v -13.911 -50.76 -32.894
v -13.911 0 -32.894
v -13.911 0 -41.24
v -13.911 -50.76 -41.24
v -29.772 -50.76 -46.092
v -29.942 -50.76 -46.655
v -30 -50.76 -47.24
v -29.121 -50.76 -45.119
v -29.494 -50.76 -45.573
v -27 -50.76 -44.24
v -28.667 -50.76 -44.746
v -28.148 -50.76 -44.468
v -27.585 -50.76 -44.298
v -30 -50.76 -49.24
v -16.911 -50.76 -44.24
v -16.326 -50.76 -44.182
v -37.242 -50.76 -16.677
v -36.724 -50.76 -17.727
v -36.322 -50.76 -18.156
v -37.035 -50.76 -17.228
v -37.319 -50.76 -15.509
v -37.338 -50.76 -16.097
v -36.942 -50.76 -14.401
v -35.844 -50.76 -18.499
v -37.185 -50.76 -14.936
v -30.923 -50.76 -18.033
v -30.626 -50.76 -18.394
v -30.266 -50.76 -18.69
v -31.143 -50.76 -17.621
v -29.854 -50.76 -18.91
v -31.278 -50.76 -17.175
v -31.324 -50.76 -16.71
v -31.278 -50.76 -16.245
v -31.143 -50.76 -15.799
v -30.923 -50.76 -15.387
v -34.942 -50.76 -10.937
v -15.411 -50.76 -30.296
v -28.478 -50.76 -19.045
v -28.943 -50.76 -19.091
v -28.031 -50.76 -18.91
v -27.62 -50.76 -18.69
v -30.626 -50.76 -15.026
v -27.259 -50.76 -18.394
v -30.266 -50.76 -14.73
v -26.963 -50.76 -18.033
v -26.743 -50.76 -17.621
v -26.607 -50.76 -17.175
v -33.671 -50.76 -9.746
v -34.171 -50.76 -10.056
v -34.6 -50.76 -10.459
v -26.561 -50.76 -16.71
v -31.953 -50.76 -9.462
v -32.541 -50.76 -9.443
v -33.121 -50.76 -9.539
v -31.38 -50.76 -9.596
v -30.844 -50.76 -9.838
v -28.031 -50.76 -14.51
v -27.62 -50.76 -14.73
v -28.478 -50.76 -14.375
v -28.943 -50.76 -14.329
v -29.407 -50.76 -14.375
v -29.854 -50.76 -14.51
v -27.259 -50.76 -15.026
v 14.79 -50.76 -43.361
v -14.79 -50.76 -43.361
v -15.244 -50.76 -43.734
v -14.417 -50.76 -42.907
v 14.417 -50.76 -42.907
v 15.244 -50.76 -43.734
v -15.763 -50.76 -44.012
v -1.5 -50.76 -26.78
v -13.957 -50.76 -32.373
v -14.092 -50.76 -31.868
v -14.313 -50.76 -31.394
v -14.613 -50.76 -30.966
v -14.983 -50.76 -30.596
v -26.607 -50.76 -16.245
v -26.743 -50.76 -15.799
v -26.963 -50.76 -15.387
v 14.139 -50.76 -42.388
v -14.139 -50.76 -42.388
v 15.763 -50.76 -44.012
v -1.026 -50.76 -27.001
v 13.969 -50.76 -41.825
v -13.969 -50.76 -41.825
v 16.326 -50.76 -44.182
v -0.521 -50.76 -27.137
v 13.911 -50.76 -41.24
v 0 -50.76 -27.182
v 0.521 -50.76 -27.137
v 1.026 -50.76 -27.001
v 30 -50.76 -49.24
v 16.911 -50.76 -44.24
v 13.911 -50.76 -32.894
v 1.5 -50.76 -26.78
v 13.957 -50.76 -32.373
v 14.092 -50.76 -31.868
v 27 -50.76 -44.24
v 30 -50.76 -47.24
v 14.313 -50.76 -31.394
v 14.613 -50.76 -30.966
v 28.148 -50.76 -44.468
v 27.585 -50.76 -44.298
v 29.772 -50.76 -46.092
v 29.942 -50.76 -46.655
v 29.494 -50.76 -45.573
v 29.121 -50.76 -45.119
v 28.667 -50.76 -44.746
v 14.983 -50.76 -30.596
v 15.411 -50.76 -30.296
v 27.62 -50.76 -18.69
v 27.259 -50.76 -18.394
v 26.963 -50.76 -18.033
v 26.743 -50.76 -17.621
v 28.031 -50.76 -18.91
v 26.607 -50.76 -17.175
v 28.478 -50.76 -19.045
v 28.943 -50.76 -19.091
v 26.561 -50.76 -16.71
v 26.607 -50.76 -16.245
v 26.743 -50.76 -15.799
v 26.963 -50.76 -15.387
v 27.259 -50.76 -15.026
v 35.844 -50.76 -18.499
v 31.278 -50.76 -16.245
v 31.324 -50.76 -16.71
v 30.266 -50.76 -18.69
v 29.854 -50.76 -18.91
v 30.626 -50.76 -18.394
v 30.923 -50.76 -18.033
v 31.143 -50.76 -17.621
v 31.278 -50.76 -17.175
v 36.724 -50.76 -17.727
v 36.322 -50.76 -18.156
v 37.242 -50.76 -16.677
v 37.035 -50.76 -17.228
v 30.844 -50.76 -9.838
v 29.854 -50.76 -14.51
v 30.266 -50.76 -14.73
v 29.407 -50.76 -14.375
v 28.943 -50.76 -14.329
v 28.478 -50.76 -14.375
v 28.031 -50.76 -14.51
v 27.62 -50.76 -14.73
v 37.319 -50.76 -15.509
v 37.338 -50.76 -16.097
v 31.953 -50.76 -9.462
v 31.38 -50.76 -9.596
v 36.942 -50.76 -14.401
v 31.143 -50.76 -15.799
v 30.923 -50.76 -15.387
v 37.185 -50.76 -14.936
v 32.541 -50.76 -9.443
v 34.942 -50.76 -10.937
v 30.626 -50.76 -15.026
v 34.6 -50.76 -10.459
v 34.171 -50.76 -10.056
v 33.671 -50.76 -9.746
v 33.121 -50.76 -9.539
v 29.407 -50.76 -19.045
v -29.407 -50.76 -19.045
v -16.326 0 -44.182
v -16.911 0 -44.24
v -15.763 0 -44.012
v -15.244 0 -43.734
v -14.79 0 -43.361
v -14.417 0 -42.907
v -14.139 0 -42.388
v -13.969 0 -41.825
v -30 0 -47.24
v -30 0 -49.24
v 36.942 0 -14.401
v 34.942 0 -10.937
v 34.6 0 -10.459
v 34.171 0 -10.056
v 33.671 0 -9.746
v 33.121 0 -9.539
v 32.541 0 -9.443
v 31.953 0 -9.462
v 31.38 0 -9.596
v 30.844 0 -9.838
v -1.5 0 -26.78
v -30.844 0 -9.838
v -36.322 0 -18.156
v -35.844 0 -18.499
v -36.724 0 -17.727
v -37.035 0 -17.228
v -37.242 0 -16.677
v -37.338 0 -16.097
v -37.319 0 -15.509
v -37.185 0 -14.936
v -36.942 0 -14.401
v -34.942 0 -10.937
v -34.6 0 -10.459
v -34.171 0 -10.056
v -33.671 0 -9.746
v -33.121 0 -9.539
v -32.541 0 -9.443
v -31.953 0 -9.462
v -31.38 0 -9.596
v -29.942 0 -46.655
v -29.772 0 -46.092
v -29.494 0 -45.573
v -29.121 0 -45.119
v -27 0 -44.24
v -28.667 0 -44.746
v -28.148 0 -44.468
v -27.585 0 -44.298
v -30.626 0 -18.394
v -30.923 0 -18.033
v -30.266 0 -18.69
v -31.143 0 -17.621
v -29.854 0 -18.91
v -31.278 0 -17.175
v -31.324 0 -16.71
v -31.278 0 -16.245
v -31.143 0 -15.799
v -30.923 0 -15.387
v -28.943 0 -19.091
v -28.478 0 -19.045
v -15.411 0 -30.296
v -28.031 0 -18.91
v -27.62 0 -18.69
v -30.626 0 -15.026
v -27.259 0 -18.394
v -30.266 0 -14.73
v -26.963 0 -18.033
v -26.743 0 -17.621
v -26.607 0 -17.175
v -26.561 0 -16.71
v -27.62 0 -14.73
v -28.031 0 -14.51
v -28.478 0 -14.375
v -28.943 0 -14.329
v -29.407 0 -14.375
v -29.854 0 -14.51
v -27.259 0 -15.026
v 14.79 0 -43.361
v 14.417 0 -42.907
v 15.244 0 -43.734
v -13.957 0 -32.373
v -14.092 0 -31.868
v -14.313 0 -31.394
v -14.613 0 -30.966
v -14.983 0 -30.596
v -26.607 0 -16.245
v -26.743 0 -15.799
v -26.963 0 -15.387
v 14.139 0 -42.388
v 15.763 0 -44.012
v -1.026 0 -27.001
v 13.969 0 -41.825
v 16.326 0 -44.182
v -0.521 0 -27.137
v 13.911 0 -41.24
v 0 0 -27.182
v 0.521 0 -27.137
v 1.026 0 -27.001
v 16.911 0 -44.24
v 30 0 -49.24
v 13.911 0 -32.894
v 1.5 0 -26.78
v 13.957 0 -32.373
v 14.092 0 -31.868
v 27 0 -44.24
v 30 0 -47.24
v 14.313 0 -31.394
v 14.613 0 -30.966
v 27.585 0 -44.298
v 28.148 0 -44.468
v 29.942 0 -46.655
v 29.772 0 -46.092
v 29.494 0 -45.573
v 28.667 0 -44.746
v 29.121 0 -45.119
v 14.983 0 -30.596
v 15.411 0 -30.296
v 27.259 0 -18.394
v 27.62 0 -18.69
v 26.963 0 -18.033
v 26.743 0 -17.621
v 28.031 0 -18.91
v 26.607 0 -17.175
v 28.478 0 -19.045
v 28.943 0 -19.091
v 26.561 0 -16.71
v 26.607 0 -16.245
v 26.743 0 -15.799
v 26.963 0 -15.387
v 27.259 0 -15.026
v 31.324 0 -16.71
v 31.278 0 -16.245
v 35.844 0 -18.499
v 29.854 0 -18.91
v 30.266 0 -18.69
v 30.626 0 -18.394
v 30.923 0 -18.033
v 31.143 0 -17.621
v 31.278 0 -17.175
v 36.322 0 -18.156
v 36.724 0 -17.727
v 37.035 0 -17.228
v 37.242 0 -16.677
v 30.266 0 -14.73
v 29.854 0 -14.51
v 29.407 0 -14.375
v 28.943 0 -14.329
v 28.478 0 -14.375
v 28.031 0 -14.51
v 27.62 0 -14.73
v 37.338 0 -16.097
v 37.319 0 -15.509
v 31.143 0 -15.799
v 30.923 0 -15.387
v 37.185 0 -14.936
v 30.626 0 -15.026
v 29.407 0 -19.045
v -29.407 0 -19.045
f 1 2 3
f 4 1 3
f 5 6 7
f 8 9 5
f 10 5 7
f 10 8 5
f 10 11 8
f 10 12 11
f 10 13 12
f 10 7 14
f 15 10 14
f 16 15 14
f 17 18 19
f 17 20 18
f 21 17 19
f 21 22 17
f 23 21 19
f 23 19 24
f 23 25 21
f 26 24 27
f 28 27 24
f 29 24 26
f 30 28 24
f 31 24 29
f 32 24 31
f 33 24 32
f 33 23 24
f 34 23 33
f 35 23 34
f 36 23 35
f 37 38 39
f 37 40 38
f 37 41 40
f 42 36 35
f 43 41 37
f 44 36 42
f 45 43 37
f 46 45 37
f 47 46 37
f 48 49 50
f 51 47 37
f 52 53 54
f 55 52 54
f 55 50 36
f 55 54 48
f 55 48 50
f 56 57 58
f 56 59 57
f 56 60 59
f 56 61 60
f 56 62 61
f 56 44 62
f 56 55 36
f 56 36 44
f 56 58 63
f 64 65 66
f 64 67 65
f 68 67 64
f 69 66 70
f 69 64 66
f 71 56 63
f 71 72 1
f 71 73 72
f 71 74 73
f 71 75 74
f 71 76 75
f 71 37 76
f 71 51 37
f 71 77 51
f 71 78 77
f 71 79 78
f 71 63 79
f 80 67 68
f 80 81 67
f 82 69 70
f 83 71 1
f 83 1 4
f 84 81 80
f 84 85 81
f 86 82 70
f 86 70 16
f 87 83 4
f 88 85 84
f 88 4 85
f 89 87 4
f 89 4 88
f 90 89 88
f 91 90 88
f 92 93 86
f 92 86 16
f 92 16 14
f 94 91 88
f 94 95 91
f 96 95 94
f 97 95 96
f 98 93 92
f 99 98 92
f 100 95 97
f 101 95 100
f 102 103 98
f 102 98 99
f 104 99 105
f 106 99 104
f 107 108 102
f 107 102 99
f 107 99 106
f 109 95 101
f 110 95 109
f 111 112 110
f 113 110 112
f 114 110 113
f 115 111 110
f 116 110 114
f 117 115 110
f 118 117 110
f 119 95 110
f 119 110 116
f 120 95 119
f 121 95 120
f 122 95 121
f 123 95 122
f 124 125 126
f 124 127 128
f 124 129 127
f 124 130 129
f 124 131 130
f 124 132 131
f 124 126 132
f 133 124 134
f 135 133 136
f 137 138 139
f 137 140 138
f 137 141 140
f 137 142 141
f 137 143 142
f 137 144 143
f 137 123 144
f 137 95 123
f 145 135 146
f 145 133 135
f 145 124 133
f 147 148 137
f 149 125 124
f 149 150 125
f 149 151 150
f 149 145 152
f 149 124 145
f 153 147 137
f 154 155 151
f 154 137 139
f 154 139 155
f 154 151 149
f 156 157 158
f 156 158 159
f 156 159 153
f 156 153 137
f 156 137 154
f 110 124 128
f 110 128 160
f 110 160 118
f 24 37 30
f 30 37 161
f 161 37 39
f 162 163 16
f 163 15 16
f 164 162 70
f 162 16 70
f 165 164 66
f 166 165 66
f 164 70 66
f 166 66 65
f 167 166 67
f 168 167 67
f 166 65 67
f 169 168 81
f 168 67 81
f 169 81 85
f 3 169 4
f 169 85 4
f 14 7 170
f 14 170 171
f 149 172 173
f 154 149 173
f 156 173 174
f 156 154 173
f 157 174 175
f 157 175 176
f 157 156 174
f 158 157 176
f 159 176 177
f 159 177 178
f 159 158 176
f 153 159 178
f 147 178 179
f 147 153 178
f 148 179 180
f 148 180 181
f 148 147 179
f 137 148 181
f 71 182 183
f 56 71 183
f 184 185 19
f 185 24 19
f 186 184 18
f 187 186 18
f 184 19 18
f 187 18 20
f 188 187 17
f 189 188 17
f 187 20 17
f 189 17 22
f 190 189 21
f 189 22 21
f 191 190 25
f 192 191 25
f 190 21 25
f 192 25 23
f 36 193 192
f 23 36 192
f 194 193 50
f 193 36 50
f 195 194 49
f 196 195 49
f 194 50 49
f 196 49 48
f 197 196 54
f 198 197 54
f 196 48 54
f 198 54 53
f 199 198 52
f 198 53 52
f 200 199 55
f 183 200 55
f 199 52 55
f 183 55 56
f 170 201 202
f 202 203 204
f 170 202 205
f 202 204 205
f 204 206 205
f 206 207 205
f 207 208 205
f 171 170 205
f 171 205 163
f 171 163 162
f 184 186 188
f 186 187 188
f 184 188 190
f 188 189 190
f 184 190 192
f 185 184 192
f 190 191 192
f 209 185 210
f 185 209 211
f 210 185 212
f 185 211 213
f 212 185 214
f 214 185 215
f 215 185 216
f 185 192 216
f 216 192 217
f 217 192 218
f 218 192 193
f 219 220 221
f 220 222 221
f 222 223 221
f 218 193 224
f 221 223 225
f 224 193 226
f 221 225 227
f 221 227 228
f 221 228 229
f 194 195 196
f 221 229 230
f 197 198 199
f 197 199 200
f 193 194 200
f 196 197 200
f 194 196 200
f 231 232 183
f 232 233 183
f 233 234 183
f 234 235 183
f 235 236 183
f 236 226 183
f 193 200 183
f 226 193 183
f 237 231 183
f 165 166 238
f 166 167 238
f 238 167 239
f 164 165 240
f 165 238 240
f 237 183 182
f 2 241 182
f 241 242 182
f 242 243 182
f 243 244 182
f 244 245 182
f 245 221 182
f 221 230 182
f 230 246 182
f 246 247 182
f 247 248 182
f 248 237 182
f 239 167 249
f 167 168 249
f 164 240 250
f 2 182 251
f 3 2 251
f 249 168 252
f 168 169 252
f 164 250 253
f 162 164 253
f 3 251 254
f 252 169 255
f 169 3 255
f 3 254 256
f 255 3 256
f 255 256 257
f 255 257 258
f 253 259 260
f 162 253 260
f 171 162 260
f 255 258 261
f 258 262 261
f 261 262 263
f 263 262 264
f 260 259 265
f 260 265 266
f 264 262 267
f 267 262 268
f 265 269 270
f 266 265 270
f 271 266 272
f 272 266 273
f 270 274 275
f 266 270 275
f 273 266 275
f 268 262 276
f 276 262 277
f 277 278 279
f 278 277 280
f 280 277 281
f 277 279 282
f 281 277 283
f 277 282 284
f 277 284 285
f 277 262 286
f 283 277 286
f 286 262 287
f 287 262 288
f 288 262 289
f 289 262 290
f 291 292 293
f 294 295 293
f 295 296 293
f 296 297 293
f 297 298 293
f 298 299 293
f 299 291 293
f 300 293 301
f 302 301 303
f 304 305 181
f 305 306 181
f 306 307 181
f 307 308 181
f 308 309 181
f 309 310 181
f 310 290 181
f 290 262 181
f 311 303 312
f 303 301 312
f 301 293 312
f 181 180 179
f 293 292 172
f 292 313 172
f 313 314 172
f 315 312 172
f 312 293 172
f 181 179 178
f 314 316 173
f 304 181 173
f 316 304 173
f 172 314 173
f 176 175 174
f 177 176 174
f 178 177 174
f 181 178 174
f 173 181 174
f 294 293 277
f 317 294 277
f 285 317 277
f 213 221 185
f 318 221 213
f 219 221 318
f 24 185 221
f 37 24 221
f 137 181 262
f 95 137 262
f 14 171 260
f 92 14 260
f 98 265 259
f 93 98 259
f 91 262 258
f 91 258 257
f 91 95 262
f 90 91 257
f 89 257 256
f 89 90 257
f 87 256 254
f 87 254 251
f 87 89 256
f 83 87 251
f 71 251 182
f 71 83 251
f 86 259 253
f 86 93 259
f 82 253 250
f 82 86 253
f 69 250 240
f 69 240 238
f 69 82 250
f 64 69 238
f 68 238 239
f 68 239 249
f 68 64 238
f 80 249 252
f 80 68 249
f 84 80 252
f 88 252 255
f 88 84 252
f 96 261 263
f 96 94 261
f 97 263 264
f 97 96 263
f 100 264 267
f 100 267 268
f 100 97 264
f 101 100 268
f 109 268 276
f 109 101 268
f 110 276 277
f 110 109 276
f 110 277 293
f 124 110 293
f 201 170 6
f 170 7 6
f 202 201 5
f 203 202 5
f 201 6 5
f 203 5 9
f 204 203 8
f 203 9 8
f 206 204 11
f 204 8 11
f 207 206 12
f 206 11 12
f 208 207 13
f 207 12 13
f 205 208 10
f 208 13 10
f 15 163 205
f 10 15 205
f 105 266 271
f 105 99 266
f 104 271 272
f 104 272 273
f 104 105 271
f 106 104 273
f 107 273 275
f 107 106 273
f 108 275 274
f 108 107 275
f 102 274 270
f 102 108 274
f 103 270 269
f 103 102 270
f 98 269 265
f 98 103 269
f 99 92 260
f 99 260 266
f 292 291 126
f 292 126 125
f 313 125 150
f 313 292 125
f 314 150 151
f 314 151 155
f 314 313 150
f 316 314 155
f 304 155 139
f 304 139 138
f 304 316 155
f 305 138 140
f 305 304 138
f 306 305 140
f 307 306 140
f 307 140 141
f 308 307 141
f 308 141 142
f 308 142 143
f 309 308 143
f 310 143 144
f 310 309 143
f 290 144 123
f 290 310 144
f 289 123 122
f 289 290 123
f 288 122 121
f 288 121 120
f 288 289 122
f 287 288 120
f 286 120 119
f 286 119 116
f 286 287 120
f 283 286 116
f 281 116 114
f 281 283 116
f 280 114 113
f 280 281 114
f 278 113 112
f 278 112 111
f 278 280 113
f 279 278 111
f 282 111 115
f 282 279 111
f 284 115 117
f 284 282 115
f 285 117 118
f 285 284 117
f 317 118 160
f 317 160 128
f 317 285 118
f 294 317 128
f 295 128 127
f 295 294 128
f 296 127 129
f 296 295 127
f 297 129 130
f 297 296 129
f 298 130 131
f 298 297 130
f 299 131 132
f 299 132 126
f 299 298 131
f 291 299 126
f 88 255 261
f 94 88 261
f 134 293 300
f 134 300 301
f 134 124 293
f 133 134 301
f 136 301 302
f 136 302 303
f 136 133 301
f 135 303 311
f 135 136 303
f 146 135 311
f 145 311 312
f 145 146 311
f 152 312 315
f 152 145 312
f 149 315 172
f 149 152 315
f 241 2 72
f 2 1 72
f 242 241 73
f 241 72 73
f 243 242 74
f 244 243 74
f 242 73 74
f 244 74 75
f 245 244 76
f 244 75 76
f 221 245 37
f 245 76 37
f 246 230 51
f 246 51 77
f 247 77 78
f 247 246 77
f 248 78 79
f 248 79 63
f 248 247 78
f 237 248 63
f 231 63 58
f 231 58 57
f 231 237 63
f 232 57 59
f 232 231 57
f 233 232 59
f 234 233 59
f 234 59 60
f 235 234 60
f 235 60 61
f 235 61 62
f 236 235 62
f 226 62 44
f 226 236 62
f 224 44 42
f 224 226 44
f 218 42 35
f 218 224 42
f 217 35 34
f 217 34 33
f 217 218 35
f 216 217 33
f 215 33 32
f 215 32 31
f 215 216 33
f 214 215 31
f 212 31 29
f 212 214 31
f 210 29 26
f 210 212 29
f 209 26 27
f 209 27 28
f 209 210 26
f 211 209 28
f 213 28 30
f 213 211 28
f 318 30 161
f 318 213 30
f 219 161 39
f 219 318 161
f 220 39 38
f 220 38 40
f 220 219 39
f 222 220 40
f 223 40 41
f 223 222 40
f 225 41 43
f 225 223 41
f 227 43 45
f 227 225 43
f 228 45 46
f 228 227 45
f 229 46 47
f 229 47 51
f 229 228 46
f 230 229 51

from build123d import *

# Parameters (mm, degrees)
F0_R     = 2.38125
F1_DEPTH = 50.76
F2_R     = 3


with BuildPart() as f1:
    # F0 (on Front) → F1 (new body)
    with BuildSketch(Plane.XZ):
        Polygon((13.911133, -49.24), (30, -49.24), (30, -44.24), (13.911133, -44.24), (13.911133, -31.161906), (38.442495, -16.998718), (33.442495, -8.338464), (0, -27.646497), (-33.442495, -8.338464), (-38.442495, -16.998718), (-13.911133, -31.161906), (-13.911133, -44.24), (-30, -44.24), (-30, -49.24), (-13.911133, -49.24), align=None)
        with Locations((-28.942569, -16.71)):
            Circle(F0_R, mode=Mode.SUBTRACT)
        with Locations((28.942569, -16.71)):
            Circle(F0_R, mode=Mode.SUBTRACT)
    extrude(amount=F1_DEPTH)

    # F2
    f2_edges = [f1.edges().sort_by_distance(p)[0] for p in [
        (-33.442495, -25.38, -8.338464),
        (-38.442495, -25.38, -16.998718),
        (0, -25.38, -27.646497),
        (33.442495, -25.38, -8.338464),
        (38.442495, -25.38, -16.998718),
        (13.911133, -25.38, -31.161906),
        (13.911133, -25.38, -44.24),
        (-13.911133, -25.38, -31.161906),
        (-13.911133, -25.38, -44.24),
        (-30, -25.38, -44.24),
        (30, -25.38, -44.24),
    ]]
    fillet(f2_edges, radius=F2_R)


solid = f1.part
